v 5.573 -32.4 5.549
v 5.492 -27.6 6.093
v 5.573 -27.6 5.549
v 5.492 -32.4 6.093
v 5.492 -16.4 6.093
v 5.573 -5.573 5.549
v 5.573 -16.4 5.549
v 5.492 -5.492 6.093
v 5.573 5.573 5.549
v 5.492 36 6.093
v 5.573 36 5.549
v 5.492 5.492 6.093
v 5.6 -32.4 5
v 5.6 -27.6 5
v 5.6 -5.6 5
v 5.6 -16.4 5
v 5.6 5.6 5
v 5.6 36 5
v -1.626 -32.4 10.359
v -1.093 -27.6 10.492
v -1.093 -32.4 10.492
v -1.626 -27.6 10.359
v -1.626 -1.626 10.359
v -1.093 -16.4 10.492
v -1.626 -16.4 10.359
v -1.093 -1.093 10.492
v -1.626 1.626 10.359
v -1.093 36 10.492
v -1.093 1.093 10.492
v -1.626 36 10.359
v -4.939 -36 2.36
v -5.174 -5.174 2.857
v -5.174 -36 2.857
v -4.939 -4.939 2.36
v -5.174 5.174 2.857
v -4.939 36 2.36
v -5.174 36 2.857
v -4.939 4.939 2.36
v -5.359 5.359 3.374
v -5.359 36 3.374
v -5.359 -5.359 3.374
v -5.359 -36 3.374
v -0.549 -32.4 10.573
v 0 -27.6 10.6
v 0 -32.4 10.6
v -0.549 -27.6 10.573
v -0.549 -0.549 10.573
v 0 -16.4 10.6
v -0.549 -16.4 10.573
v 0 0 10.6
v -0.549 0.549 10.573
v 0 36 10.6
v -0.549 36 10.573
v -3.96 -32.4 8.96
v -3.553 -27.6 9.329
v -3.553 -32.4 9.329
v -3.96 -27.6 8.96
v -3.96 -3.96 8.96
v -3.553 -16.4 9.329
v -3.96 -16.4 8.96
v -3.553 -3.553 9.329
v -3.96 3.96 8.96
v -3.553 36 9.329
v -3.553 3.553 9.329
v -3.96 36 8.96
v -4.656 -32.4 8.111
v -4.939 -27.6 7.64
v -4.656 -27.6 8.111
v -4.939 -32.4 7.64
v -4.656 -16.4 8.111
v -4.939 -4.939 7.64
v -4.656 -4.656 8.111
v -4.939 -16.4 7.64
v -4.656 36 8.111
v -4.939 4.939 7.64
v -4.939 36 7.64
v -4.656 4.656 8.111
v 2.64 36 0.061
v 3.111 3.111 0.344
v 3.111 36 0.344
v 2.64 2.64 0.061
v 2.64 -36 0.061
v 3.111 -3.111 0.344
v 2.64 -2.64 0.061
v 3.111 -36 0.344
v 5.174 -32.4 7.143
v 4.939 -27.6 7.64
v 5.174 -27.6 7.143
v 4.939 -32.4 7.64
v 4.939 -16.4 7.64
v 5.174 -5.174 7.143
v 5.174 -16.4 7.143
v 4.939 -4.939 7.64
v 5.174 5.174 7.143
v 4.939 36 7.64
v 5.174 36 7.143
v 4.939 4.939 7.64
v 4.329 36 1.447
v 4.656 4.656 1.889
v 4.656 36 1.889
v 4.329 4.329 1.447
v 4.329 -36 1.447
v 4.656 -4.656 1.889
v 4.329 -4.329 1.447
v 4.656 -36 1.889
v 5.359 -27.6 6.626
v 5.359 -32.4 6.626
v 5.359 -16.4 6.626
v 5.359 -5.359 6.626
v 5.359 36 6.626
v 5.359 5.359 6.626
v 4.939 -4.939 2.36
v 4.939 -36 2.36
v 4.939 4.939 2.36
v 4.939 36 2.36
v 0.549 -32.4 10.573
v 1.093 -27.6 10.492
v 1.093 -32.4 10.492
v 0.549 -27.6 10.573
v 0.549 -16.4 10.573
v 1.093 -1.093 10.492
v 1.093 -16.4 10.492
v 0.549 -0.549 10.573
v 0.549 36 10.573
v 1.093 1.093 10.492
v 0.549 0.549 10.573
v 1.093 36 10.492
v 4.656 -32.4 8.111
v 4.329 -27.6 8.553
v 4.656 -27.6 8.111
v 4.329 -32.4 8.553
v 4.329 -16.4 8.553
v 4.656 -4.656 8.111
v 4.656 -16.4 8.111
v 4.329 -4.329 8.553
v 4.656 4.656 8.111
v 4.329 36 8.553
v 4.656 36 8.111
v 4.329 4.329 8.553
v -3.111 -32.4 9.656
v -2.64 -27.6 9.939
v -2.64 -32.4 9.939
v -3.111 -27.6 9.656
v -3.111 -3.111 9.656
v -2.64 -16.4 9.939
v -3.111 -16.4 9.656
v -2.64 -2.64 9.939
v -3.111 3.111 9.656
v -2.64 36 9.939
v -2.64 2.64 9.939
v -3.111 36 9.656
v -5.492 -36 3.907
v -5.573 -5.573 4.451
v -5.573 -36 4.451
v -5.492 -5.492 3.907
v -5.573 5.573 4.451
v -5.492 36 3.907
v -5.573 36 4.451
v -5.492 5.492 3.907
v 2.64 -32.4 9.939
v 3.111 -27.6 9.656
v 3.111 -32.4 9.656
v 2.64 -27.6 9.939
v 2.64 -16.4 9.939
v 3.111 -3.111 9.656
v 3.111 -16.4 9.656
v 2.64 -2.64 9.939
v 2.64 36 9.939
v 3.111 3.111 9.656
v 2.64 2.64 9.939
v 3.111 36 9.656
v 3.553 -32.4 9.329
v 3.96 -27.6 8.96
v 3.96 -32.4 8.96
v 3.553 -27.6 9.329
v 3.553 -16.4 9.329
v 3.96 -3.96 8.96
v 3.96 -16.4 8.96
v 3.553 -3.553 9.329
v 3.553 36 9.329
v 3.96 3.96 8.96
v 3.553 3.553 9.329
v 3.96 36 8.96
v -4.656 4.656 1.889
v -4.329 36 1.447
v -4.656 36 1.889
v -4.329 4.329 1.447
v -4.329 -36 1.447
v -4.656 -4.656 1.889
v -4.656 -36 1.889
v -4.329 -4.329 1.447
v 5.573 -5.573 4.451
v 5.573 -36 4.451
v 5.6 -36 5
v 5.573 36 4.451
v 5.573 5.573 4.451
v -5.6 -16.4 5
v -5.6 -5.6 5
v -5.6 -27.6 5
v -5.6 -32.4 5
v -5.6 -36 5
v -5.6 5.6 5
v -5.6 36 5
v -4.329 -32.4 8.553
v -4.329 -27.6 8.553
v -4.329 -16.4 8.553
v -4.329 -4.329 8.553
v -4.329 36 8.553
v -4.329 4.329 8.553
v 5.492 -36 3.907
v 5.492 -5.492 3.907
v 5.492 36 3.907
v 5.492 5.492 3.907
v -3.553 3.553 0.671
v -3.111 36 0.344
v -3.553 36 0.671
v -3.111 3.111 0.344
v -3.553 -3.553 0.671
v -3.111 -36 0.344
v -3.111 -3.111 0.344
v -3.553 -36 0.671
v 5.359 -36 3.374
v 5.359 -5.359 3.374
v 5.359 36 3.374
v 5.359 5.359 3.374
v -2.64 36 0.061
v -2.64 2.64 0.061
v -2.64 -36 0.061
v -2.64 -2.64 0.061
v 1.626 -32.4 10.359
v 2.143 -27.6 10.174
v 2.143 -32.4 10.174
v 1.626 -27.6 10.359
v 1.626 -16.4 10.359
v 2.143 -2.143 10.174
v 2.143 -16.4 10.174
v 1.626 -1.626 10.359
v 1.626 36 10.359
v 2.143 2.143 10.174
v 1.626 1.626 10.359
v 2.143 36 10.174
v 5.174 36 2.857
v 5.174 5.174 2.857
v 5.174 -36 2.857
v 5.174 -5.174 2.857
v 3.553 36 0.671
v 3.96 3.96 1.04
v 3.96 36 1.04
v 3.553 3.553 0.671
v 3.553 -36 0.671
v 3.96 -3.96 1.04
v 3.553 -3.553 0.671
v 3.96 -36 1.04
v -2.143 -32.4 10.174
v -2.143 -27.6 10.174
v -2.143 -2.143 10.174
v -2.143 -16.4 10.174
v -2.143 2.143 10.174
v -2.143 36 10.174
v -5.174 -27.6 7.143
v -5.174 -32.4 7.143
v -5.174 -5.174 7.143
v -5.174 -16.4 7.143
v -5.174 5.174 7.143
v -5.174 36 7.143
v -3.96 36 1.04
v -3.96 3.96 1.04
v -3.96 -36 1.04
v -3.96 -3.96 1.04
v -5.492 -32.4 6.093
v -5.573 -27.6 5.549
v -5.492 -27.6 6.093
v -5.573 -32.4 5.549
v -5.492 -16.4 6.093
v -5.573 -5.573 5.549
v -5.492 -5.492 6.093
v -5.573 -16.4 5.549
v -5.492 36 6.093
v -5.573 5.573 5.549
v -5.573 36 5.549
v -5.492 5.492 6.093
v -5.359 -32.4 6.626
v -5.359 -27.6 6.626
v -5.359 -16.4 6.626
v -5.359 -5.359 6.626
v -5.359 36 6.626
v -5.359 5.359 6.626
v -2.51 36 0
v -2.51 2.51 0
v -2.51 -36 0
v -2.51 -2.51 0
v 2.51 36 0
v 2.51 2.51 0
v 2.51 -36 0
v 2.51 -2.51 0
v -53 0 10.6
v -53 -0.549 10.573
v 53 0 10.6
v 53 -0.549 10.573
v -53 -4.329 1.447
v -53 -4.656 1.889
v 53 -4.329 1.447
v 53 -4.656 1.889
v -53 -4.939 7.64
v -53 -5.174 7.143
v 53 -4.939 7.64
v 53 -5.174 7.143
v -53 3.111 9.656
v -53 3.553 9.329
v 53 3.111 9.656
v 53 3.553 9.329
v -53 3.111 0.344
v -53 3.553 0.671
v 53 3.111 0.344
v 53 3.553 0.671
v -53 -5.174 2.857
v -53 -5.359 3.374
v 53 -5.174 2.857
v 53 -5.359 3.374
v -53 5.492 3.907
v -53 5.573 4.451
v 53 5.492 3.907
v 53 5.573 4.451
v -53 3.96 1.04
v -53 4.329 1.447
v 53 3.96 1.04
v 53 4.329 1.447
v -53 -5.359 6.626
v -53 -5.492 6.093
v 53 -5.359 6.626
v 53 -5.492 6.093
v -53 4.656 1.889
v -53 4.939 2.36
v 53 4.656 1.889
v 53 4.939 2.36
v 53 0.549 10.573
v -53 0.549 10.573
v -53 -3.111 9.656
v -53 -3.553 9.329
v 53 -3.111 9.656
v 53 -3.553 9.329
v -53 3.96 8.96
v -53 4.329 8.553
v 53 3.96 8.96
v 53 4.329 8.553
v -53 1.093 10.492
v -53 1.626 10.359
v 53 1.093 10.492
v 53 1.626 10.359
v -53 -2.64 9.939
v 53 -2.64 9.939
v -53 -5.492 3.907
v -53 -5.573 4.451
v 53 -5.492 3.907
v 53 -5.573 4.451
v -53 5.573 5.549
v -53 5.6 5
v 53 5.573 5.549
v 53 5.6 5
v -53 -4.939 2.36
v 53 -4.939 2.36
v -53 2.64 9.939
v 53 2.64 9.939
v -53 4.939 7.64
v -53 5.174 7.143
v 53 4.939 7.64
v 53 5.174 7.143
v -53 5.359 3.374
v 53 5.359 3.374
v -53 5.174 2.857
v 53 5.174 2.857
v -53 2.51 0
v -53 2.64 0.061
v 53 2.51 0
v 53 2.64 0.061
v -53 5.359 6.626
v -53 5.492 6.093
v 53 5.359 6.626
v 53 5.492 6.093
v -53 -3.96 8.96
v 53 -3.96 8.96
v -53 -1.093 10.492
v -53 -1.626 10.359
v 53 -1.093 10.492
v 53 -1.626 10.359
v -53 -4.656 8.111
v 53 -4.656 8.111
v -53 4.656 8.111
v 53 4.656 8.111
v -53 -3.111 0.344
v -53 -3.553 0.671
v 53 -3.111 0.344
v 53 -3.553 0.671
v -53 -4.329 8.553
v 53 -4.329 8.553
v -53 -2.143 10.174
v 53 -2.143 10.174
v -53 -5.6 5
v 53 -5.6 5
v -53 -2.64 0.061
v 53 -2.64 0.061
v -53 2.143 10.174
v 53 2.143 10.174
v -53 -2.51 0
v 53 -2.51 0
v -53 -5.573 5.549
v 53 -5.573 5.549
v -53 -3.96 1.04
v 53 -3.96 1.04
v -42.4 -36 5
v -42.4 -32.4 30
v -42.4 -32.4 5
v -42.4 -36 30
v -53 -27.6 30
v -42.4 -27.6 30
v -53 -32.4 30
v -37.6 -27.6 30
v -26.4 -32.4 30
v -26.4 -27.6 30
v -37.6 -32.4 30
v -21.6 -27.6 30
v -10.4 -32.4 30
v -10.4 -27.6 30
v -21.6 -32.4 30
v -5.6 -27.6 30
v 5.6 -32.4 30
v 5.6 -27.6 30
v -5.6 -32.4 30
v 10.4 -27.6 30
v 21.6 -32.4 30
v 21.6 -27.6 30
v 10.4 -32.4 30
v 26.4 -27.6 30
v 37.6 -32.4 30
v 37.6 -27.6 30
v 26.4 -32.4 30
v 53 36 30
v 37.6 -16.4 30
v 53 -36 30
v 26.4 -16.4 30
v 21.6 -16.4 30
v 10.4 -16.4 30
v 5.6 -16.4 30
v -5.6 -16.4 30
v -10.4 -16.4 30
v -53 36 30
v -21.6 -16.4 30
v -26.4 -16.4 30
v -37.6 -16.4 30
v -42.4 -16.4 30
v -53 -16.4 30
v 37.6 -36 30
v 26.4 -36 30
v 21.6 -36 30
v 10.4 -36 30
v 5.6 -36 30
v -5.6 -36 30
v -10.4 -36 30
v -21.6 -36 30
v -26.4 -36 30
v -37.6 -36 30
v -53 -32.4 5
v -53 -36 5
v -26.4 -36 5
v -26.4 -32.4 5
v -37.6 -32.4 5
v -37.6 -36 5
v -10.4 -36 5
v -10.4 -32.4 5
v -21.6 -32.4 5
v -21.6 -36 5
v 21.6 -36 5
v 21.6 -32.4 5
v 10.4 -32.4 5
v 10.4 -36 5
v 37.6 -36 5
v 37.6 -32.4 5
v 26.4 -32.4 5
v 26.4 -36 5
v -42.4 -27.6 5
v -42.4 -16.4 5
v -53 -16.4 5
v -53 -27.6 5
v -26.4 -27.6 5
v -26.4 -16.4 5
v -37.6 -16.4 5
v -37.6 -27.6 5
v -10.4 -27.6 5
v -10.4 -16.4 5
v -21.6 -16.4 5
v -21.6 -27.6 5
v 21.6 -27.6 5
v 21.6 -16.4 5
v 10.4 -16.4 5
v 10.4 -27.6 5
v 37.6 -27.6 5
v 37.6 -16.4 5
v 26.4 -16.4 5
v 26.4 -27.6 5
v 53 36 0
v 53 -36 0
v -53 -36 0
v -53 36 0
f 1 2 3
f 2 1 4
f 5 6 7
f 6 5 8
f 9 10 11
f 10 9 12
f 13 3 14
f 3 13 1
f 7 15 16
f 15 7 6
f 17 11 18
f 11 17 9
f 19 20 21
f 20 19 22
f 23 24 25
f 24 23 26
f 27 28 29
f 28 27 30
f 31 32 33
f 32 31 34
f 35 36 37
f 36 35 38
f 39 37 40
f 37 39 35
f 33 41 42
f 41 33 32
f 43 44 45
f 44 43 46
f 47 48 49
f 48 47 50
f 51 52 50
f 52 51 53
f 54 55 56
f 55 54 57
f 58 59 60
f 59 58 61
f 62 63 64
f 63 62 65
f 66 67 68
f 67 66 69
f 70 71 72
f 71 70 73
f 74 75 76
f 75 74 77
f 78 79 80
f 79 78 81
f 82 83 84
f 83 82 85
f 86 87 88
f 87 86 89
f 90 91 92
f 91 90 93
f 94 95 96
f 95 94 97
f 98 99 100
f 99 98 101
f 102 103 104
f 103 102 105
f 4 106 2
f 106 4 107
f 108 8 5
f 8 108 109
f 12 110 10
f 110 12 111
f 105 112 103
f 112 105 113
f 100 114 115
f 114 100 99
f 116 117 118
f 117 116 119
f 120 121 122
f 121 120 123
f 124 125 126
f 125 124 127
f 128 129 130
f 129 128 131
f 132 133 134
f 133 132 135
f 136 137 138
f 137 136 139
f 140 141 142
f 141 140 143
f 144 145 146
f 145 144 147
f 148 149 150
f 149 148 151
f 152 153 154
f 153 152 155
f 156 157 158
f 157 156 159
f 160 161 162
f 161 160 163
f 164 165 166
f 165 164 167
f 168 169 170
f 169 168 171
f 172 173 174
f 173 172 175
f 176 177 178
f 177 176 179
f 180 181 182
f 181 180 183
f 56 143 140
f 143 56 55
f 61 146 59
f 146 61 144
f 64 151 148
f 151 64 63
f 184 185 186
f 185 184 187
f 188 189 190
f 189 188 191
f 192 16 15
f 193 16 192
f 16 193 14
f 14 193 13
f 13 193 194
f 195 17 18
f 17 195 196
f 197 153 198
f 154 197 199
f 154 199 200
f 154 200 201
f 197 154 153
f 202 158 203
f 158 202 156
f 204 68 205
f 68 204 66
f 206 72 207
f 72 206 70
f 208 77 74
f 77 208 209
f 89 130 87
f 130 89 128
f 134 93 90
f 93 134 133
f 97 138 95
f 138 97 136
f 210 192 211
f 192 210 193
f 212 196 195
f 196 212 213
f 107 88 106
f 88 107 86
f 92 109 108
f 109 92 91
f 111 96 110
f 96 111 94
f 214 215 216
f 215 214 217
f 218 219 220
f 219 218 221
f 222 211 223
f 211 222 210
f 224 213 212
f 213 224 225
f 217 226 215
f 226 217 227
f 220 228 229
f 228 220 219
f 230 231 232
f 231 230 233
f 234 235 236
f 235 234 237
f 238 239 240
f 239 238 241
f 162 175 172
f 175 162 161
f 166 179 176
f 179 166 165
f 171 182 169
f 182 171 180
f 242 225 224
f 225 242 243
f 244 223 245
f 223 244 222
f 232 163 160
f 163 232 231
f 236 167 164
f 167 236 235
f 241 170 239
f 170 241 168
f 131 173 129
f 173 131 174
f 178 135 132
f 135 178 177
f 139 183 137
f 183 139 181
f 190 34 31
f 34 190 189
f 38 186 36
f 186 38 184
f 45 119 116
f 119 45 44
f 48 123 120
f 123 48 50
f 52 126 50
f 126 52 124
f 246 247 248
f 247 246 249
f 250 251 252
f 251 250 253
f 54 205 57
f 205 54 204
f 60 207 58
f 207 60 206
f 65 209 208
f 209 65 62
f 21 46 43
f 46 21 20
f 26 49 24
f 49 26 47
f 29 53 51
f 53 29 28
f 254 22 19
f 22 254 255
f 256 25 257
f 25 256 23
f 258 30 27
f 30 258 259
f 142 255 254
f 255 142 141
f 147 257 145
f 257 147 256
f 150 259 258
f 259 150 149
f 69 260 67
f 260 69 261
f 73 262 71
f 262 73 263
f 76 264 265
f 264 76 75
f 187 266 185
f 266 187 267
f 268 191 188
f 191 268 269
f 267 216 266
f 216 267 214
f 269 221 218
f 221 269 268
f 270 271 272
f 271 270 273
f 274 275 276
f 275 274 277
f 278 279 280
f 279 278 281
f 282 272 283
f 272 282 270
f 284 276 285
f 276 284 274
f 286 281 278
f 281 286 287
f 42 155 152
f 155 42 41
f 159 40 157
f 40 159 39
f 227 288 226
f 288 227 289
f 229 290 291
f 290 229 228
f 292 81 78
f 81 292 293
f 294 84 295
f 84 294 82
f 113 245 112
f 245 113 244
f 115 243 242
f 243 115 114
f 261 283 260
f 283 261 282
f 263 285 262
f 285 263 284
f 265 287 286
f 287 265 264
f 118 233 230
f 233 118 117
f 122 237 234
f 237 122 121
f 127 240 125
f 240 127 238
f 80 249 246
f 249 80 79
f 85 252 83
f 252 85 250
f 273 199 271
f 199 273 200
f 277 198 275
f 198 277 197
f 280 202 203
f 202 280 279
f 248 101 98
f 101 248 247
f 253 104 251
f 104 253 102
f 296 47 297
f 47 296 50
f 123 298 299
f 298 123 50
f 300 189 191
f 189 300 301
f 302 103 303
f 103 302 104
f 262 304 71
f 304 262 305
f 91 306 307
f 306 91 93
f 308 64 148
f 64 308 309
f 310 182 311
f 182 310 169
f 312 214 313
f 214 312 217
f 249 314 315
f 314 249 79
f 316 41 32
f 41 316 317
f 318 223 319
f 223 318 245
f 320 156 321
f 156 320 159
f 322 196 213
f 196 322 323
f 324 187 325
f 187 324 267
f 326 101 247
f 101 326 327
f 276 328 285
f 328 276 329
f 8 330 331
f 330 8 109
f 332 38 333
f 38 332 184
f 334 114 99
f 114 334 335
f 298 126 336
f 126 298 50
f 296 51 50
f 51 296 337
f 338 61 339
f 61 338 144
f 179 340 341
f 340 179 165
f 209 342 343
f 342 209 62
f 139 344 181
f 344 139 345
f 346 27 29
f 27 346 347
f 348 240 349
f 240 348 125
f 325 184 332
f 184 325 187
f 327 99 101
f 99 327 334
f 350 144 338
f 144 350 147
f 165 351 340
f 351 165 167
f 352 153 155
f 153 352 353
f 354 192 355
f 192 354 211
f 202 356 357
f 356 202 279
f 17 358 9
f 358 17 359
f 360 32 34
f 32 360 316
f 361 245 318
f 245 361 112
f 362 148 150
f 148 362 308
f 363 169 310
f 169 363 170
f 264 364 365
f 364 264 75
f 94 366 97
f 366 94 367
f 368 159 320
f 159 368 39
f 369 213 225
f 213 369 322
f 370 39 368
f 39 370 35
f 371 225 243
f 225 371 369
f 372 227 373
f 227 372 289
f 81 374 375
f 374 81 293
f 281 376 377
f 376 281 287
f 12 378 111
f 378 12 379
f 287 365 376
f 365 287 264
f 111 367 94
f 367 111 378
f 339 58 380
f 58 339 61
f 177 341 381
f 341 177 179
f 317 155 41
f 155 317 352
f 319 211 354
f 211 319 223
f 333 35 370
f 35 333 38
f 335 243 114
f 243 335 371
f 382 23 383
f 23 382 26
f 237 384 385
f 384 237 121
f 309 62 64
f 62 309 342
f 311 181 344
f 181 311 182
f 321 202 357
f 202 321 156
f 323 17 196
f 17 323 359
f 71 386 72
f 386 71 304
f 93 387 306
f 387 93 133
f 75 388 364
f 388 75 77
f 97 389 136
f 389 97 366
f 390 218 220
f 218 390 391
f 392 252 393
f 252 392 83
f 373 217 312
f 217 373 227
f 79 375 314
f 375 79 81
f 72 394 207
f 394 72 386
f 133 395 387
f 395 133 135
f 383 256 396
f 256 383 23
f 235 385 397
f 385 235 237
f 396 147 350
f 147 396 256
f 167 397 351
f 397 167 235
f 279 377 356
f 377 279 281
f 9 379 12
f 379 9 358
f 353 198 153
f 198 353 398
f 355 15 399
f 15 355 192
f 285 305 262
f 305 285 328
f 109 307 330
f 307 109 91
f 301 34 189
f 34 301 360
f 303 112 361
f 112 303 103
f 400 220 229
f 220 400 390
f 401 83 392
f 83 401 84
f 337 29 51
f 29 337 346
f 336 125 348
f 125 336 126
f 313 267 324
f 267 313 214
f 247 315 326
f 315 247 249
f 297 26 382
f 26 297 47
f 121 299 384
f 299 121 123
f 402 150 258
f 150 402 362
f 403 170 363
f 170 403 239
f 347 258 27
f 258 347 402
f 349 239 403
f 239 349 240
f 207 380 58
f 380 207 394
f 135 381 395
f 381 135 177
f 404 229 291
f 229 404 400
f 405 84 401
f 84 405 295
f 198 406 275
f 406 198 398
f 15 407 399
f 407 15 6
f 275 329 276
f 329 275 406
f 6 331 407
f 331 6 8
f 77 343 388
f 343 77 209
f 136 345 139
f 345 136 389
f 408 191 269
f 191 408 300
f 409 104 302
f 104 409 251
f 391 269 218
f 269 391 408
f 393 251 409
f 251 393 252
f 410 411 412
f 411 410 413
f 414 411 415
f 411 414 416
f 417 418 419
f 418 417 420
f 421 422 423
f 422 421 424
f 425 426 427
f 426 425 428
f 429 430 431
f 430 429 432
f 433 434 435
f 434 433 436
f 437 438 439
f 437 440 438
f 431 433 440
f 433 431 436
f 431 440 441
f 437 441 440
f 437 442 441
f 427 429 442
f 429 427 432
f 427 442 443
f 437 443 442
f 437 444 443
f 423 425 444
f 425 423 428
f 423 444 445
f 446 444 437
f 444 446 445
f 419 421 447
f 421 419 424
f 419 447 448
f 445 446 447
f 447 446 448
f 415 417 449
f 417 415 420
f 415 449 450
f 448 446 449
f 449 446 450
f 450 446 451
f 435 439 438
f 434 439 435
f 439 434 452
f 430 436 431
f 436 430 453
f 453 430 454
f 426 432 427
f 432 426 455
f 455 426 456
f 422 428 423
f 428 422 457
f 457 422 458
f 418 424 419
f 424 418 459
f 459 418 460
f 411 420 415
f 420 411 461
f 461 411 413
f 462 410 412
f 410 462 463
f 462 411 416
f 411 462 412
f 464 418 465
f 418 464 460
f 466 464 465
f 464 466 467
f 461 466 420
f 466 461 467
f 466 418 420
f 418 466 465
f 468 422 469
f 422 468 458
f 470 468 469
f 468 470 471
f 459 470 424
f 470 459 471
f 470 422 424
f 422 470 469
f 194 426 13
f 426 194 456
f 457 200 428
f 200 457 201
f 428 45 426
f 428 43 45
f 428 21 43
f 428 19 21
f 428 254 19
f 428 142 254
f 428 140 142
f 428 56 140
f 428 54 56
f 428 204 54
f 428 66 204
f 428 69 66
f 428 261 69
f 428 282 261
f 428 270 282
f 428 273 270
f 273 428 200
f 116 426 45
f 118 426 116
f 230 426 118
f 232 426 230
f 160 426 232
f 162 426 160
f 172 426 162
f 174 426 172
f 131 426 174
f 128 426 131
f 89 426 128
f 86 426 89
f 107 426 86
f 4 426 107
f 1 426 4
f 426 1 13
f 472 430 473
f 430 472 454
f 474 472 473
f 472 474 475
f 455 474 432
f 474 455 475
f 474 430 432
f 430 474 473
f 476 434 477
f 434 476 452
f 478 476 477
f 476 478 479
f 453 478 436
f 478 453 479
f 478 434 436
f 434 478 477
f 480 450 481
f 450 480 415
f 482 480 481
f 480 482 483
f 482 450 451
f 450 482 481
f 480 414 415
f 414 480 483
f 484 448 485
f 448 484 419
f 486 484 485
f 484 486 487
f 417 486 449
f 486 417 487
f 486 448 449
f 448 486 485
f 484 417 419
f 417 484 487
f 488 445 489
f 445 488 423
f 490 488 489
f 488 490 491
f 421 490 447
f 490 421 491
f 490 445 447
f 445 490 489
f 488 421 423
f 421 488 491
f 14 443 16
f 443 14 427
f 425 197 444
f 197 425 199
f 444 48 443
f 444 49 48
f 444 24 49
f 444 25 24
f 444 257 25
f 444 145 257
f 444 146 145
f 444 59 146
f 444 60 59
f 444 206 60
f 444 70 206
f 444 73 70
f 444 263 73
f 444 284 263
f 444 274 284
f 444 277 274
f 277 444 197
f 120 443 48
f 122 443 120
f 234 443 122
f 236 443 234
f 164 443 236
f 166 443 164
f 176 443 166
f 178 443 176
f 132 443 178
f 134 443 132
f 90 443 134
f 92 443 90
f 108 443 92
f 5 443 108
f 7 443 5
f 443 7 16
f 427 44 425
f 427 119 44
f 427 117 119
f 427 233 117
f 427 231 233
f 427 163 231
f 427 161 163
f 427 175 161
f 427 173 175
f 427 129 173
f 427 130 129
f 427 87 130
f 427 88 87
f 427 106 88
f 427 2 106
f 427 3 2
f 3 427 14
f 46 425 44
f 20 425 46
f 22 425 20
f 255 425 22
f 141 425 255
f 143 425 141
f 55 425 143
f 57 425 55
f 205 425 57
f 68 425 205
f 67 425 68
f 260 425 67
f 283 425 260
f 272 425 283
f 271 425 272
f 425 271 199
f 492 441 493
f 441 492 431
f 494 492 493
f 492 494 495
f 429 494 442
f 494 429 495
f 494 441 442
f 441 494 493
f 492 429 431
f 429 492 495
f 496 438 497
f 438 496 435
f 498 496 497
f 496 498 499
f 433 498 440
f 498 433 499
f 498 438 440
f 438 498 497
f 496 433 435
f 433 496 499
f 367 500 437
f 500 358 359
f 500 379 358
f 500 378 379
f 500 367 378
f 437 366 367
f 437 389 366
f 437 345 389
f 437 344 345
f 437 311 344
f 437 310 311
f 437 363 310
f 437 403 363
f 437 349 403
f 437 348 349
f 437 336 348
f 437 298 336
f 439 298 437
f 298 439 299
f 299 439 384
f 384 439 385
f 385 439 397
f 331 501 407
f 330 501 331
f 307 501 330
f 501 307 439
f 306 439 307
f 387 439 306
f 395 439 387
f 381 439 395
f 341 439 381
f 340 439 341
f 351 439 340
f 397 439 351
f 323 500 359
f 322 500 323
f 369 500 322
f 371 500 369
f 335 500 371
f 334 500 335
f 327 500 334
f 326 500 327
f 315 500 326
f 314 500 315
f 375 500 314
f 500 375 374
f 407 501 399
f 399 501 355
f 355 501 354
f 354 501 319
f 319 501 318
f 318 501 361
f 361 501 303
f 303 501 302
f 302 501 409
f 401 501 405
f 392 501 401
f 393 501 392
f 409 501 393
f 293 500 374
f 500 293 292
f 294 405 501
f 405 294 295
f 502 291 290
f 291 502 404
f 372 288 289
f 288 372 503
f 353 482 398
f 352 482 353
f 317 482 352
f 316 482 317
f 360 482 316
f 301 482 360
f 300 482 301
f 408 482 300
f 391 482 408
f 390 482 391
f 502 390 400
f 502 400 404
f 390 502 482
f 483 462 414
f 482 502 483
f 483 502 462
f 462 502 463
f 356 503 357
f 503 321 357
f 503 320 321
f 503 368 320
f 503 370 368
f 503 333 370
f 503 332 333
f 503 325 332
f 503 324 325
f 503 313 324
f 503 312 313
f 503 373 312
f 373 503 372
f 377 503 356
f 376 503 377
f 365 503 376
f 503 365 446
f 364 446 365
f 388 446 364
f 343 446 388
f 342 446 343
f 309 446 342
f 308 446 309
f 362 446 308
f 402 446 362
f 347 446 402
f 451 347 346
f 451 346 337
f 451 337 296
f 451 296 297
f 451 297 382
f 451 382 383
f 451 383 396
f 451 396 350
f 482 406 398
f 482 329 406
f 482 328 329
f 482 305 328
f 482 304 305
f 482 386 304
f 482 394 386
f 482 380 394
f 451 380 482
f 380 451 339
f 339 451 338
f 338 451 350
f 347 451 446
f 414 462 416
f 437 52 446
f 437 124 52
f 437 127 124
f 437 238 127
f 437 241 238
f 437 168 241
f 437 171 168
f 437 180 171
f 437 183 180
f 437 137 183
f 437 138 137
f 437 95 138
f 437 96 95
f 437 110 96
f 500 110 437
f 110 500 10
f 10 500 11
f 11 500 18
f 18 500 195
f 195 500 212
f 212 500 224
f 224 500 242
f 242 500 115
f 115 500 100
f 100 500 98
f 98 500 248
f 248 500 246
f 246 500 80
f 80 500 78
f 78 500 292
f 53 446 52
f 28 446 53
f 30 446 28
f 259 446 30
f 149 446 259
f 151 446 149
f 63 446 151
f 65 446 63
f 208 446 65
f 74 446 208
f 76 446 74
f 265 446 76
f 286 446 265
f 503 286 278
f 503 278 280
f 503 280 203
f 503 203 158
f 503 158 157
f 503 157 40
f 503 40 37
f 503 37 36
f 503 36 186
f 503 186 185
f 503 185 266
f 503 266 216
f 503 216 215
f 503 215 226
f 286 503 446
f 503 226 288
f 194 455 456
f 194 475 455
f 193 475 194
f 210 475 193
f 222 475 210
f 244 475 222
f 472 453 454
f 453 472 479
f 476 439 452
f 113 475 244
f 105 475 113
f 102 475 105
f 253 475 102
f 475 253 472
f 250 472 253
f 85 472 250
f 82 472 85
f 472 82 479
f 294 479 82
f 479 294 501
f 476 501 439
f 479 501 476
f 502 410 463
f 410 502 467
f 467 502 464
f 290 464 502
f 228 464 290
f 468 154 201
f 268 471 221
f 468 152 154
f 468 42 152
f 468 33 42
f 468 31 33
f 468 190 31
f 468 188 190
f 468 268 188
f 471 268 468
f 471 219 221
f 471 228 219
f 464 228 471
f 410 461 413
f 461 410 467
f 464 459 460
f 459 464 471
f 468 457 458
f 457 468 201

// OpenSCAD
// Built by bench/smallmodels/features/compiler.py from a list of features.
$fn = 64;
difference() {
  union() {
    translate([0, 0, 0]) translate([-53, -36, 0]) cube([106, 72, 30]);
  }
  union() {
    translate([0, 0, 5]) rotate([0, 0, 0]) rotate([90, 0, 0]) cylinder(d = 11.2, h = 1120, center = true);
    translate([0, 0, 5]) rotate([0, 0, 0]) rotate([0, 90, 0]) cylinder(d = 11.2, h = 1120, center = true);
    translate([-48, -70, 5]) rotate([0, 0, 0]) translate([-5.6, -5.6, 0]) cube([11.2, 11.2, 25]);
    translate([-32, -70, 5]) rotate([0, 0, 0]) translate([-5.6, -5.6, 0]) cube([11.2, 11.2, 25]);
    translate([-16, -70, 5]) rotate([0, 0, 0]) translate([-5.6, -5.6, 0]) cube([11.2, 11.2, 25]);
    translate([0, -70, 5]) rotate([0, 0, 0]) translate([-5.6, -5.6, 0]) cube([11.2, 11.2, 25]);
    translate([16, -70, 5]) rotate([0, 0, 0]) translate([-5.6, -5.6, 0]) cube([11.2, 11.2, 25]);
    translate([32, -70, 5]) rotate([0, 0, 0]) translate([-5.6, -5.6, 0]) cube([11.2, 11.2, 25]);
    translate([-48, -54, 5]) rotate([0, 0, 0]) translate([-5.6, -5.6, 0]) cube([11.2, 11.2, 25]);
    translate([-32, -54, 5]) rotate([0, 0, 0]) translate([-5.6, -5.6, 0]) cube([11.2, 11.2, 25]);
    translate([-16, -54, 5]) rotate([0, 0, 0]) translate([-5.6, -5.6, 0]) cube([11.2, 11.2, 25]);
    translate([0, -54, 5]) rotate([0, 0, 0]) translate([-5.6, -5.6, 0]) cube([11.2, 11.2, 25]);
    translate([16, -54, 5]) rotate([0, 0, 0]) translate([-5.6, -5.6, 0]) cube([11.2, 11.2, 25]);
    translate([32, -54, 5]) rotate([0, 0, 0]) translate([-5.6, -5.6, 0]) cube([11.2, 11.2, 25]);
    translate([-48, -38, 5]) rotate([0, 0, 0]) translate([-5.6, -5.6, 0]) cube([11.2, 11.2, 25]);
    translate([-32, -38, 5]) rotate([0, 0, 0]) translate([-5.6, -5.6, 0]) cube([11.2, 11.2, 25]);
    translate([-16, -38, 5]) rotate([0, 0, 0]) translate([-5.6, -5.6, 0]) cube([11.2, 11.2, 25]);
    translate([0, -38, 5]) rotate([0, 0, 0]) translate([-5.6, -5.6, 0]) cube([11.2, 11.2, 25]);
    translate([16, -38, 5]) rotate([0, 0, 0]) translate([-5.6, -5.6, 0]) cube([11.2, 11.2, 25]);
    translate([32, -38, 5]) rotate([0, 0, 0]) translate([-5.6, -5.6, 0]) cube([11.2, 11.2, 25]);
    translate([-48, -22, 5]) rotate([0, 0, 0]) translate([-5.6, -5.6, 0]) cube([11.2, 11.2, 25]);
    translate([-32, -22, 5]) rotate([0, 0, 0]) translate([-5.6, -5.6, 0]) cube([11.2, 11.2, 25]);
    translate([-16, -22, 5]) rotate([0, 0, 0]) translate([-5.6, -5.6, 0]) cube([11.2, 11.2, 25]);
    translate([0, -22, 5]) rotate([0, 0, 0]) translate([-5.6, -5.6, 0]) cube([11.2, 11.2, 25]);
    translate([16, -22, 5]) rotate([0, 0, 0]) translate([-5.6, -5.6, 0]) cube([11.2, 11.2, 25]);
    translate([32, -22, 5]) rotate([0, 0, 0]) translate([-5.6, -5.6, 0]) cube([11.2, 11.2, 25]);
  }
}
